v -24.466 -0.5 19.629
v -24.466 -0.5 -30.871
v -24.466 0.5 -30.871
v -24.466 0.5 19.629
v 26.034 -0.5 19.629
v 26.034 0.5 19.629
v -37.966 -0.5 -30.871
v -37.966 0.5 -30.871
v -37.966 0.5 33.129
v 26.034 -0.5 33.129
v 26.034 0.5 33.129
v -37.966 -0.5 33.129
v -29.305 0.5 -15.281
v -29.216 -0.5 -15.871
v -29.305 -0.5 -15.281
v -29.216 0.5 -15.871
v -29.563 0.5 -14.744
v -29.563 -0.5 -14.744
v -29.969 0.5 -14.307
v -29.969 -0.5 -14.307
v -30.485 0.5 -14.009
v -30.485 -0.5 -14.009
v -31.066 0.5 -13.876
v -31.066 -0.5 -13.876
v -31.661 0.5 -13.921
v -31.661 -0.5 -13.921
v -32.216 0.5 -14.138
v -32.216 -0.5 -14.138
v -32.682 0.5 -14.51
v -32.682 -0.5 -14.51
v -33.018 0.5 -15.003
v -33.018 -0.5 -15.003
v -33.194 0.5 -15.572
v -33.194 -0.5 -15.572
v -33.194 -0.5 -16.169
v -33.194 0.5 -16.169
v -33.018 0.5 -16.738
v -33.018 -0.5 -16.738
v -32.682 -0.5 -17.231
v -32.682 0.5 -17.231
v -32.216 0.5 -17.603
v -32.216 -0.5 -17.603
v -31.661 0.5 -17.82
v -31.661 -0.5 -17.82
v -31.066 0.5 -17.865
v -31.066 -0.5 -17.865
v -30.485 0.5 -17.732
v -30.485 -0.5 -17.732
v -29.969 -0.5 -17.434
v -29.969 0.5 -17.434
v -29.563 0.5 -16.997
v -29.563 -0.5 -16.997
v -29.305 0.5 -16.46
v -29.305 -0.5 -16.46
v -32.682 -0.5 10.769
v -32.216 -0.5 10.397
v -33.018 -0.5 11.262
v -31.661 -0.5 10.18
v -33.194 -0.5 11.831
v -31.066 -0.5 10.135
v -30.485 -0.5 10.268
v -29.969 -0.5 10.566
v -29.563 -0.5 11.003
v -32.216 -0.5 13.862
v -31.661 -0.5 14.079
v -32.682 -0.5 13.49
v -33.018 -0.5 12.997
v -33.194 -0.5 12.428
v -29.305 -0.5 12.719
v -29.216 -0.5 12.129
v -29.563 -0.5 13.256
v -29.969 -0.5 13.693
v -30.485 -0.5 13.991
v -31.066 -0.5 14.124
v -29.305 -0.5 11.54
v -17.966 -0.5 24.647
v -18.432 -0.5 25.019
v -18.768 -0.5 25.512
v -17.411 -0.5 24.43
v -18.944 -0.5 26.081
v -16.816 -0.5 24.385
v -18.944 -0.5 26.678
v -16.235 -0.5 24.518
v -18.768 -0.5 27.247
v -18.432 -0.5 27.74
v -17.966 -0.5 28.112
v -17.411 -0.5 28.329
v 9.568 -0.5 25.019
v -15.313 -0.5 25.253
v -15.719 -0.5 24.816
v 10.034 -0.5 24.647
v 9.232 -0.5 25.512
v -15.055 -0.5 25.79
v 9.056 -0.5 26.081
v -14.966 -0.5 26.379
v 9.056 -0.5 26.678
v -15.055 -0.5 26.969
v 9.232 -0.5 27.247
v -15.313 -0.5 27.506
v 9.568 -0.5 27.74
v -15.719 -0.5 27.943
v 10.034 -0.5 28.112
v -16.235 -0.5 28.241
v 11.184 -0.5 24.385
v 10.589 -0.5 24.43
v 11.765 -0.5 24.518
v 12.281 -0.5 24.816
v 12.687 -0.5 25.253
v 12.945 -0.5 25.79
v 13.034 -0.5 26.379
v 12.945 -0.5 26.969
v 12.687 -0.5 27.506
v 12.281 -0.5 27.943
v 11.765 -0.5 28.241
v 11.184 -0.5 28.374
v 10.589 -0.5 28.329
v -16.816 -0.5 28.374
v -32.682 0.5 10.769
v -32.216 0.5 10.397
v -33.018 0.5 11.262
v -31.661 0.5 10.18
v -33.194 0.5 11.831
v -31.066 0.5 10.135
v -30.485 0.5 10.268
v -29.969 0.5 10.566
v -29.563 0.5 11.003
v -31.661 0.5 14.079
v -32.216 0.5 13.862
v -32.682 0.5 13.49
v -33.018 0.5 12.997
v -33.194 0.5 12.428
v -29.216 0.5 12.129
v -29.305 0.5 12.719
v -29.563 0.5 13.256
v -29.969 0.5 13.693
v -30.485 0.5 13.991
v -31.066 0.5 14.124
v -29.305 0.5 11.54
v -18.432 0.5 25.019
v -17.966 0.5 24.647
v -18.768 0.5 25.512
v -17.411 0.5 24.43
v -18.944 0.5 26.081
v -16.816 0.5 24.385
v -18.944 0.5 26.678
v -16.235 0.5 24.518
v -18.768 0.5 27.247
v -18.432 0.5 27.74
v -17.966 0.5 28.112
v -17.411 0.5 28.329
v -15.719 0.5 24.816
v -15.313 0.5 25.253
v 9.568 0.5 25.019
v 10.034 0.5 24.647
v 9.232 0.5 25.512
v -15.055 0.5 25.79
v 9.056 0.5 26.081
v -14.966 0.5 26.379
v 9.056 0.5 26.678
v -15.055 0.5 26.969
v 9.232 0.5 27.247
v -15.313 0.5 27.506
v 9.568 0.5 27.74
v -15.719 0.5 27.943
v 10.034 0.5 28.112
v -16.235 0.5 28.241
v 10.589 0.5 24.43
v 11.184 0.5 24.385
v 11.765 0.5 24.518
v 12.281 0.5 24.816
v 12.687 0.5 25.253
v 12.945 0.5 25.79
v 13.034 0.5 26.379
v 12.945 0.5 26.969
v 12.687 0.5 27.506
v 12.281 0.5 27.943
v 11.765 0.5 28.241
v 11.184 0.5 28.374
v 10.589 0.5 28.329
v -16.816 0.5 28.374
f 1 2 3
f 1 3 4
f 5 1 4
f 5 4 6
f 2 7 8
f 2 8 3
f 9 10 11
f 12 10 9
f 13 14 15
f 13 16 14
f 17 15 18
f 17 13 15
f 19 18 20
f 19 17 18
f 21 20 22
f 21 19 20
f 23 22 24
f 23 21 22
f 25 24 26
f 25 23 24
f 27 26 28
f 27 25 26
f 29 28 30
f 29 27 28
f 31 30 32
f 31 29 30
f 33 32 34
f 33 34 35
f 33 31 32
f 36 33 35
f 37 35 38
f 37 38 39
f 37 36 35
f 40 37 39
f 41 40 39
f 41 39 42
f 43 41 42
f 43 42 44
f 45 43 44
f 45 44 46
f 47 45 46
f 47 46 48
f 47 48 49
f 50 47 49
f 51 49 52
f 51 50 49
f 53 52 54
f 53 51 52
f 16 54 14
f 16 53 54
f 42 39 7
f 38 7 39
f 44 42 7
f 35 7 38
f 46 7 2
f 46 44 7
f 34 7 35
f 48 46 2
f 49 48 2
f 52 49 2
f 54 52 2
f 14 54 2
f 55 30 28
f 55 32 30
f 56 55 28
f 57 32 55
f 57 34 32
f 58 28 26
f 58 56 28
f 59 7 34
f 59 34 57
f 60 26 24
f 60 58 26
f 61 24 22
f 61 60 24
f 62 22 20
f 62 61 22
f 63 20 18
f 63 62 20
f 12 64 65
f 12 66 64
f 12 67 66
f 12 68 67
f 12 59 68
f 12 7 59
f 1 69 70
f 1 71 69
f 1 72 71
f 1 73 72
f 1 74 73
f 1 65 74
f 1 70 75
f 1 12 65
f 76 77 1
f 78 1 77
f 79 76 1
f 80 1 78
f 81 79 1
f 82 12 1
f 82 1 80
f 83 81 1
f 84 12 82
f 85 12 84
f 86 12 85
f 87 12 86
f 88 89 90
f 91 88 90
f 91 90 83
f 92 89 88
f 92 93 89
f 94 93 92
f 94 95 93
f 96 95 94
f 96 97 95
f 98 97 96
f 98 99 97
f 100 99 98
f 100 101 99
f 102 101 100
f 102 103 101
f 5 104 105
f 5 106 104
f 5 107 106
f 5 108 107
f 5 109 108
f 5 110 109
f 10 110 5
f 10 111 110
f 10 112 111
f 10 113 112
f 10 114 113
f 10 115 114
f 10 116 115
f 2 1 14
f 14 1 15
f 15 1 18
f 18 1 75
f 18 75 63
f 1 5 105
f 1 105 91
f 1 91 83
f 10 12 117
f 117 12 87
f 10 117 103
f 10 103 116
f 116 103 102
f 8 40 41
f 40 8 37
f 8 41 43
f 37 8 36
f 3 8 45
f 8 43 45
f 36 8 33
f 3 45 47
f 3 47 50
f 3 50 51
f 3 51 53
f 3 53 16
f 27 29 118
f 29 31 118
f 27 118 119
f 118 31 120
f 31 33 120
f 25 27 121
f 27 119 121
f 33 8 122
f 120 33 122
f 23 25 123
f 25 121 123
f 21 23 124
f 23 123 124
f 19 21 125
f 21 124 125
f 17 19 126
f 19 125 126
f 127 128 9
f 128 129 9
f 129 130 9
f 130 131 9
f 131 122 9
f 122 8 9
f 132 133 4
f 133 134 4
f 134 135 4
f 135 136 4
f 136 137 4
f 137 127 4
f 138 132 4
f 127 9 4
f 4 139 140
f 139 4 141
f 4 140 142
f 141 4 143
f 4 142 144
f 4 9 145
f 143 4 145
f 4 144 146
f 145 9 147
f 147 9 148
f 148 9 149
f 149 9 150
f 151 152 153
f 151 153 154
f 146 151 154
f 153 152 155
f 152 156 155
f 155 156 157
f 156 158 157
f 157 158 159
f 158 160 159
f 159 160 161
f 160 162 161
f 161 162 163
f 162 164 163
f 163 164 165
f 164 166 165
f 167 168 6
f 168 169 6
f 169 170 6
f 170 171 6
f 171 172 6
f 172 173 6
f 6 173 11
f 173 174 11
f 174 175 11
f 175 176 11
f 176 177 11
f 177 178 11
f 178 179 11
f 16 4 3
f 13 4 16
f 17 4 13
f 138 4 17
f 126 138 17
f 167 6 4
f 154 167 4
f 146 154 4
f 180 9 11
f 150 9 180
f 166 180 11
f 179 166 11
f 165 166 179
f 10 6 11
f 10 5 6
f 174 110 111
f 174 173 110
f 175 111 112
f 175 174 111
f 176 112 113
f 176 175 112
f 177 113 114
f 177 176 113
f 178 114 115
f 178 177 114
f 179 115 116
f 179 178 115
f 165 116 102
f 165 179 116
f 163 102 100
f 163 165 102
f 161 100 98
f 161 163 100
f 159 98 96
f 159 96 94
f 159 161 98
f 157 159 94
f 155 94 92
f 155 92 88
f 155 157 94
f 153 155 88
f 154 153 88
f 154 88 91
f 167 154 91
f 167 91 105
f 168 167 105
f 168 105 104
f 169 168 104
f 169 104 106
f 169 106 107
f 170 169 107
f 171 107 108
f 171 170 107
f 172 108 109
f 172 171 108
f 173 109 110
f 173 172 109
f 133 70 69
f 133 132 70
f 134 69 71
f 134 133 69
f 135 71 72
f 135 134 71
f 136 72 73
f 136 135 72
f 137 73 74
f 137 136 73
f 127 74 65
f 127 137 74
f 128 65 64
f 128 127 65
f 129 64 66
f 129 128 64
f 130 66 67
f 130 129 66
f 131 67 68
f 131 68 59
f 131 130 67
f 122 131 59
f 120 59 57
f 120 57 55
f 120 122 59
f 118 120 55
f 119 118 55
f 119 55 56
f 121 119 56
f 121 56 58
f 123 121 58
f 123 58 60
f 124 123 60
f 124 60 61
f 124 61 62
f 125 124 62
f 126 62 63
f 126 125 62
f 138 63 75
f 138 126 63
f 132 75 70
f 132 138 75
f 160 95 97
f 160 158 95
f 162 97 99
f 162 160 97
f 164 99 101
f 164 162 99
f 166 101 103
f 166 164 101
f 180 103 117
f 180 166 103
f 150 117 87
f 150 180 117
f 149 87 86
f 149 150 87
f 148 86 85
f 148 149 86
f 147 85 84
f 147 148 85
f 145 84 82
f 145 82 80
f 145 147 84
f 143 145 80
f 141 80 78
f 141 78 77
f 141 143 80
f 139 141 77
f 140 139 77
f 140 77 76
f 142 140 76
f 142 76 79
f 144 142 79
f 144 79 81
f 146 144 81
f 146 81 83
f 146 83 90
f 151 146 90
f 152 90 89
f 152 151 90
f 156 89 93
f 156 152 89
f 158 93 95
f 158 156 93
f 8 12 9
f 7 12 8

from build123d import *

# Parameters (mm, degrees)
F0_R     = 2
F1_DEPTH = 0.5


with BuildPart() as f1:
    # F0 (on Front) → F1 (new body, symmetric)
    with BuildSketch(Plane.XZ):
        Polygon((-37.965911, 33.129498), (-37.965911, -30.870502), (-24.465911, -30.870502), (-24.465911, 19.629498), (26.034089, 19.629498), (26.034089, 33.129498), align=None)
        with Locations((-31.215911, -15.870502)):
            Circle(F0_R, mode=Mode.SUBTRACT)
        with Locations((-31.215911, 12.129498)):
            Circle(F0_R, mode=Mode.SUBTRACT)
        with Locations((-16.965911, 26.379498)):
            Circle(F0_R, mode=Mode.SUBTRACT)
        with Locations((11.034089, 26.379498)):
            Circle(F0_R, mode=Mode.SUBTRACT)
    extrude(amount=F1_DEPTH, both=True)


solid = f1.part
